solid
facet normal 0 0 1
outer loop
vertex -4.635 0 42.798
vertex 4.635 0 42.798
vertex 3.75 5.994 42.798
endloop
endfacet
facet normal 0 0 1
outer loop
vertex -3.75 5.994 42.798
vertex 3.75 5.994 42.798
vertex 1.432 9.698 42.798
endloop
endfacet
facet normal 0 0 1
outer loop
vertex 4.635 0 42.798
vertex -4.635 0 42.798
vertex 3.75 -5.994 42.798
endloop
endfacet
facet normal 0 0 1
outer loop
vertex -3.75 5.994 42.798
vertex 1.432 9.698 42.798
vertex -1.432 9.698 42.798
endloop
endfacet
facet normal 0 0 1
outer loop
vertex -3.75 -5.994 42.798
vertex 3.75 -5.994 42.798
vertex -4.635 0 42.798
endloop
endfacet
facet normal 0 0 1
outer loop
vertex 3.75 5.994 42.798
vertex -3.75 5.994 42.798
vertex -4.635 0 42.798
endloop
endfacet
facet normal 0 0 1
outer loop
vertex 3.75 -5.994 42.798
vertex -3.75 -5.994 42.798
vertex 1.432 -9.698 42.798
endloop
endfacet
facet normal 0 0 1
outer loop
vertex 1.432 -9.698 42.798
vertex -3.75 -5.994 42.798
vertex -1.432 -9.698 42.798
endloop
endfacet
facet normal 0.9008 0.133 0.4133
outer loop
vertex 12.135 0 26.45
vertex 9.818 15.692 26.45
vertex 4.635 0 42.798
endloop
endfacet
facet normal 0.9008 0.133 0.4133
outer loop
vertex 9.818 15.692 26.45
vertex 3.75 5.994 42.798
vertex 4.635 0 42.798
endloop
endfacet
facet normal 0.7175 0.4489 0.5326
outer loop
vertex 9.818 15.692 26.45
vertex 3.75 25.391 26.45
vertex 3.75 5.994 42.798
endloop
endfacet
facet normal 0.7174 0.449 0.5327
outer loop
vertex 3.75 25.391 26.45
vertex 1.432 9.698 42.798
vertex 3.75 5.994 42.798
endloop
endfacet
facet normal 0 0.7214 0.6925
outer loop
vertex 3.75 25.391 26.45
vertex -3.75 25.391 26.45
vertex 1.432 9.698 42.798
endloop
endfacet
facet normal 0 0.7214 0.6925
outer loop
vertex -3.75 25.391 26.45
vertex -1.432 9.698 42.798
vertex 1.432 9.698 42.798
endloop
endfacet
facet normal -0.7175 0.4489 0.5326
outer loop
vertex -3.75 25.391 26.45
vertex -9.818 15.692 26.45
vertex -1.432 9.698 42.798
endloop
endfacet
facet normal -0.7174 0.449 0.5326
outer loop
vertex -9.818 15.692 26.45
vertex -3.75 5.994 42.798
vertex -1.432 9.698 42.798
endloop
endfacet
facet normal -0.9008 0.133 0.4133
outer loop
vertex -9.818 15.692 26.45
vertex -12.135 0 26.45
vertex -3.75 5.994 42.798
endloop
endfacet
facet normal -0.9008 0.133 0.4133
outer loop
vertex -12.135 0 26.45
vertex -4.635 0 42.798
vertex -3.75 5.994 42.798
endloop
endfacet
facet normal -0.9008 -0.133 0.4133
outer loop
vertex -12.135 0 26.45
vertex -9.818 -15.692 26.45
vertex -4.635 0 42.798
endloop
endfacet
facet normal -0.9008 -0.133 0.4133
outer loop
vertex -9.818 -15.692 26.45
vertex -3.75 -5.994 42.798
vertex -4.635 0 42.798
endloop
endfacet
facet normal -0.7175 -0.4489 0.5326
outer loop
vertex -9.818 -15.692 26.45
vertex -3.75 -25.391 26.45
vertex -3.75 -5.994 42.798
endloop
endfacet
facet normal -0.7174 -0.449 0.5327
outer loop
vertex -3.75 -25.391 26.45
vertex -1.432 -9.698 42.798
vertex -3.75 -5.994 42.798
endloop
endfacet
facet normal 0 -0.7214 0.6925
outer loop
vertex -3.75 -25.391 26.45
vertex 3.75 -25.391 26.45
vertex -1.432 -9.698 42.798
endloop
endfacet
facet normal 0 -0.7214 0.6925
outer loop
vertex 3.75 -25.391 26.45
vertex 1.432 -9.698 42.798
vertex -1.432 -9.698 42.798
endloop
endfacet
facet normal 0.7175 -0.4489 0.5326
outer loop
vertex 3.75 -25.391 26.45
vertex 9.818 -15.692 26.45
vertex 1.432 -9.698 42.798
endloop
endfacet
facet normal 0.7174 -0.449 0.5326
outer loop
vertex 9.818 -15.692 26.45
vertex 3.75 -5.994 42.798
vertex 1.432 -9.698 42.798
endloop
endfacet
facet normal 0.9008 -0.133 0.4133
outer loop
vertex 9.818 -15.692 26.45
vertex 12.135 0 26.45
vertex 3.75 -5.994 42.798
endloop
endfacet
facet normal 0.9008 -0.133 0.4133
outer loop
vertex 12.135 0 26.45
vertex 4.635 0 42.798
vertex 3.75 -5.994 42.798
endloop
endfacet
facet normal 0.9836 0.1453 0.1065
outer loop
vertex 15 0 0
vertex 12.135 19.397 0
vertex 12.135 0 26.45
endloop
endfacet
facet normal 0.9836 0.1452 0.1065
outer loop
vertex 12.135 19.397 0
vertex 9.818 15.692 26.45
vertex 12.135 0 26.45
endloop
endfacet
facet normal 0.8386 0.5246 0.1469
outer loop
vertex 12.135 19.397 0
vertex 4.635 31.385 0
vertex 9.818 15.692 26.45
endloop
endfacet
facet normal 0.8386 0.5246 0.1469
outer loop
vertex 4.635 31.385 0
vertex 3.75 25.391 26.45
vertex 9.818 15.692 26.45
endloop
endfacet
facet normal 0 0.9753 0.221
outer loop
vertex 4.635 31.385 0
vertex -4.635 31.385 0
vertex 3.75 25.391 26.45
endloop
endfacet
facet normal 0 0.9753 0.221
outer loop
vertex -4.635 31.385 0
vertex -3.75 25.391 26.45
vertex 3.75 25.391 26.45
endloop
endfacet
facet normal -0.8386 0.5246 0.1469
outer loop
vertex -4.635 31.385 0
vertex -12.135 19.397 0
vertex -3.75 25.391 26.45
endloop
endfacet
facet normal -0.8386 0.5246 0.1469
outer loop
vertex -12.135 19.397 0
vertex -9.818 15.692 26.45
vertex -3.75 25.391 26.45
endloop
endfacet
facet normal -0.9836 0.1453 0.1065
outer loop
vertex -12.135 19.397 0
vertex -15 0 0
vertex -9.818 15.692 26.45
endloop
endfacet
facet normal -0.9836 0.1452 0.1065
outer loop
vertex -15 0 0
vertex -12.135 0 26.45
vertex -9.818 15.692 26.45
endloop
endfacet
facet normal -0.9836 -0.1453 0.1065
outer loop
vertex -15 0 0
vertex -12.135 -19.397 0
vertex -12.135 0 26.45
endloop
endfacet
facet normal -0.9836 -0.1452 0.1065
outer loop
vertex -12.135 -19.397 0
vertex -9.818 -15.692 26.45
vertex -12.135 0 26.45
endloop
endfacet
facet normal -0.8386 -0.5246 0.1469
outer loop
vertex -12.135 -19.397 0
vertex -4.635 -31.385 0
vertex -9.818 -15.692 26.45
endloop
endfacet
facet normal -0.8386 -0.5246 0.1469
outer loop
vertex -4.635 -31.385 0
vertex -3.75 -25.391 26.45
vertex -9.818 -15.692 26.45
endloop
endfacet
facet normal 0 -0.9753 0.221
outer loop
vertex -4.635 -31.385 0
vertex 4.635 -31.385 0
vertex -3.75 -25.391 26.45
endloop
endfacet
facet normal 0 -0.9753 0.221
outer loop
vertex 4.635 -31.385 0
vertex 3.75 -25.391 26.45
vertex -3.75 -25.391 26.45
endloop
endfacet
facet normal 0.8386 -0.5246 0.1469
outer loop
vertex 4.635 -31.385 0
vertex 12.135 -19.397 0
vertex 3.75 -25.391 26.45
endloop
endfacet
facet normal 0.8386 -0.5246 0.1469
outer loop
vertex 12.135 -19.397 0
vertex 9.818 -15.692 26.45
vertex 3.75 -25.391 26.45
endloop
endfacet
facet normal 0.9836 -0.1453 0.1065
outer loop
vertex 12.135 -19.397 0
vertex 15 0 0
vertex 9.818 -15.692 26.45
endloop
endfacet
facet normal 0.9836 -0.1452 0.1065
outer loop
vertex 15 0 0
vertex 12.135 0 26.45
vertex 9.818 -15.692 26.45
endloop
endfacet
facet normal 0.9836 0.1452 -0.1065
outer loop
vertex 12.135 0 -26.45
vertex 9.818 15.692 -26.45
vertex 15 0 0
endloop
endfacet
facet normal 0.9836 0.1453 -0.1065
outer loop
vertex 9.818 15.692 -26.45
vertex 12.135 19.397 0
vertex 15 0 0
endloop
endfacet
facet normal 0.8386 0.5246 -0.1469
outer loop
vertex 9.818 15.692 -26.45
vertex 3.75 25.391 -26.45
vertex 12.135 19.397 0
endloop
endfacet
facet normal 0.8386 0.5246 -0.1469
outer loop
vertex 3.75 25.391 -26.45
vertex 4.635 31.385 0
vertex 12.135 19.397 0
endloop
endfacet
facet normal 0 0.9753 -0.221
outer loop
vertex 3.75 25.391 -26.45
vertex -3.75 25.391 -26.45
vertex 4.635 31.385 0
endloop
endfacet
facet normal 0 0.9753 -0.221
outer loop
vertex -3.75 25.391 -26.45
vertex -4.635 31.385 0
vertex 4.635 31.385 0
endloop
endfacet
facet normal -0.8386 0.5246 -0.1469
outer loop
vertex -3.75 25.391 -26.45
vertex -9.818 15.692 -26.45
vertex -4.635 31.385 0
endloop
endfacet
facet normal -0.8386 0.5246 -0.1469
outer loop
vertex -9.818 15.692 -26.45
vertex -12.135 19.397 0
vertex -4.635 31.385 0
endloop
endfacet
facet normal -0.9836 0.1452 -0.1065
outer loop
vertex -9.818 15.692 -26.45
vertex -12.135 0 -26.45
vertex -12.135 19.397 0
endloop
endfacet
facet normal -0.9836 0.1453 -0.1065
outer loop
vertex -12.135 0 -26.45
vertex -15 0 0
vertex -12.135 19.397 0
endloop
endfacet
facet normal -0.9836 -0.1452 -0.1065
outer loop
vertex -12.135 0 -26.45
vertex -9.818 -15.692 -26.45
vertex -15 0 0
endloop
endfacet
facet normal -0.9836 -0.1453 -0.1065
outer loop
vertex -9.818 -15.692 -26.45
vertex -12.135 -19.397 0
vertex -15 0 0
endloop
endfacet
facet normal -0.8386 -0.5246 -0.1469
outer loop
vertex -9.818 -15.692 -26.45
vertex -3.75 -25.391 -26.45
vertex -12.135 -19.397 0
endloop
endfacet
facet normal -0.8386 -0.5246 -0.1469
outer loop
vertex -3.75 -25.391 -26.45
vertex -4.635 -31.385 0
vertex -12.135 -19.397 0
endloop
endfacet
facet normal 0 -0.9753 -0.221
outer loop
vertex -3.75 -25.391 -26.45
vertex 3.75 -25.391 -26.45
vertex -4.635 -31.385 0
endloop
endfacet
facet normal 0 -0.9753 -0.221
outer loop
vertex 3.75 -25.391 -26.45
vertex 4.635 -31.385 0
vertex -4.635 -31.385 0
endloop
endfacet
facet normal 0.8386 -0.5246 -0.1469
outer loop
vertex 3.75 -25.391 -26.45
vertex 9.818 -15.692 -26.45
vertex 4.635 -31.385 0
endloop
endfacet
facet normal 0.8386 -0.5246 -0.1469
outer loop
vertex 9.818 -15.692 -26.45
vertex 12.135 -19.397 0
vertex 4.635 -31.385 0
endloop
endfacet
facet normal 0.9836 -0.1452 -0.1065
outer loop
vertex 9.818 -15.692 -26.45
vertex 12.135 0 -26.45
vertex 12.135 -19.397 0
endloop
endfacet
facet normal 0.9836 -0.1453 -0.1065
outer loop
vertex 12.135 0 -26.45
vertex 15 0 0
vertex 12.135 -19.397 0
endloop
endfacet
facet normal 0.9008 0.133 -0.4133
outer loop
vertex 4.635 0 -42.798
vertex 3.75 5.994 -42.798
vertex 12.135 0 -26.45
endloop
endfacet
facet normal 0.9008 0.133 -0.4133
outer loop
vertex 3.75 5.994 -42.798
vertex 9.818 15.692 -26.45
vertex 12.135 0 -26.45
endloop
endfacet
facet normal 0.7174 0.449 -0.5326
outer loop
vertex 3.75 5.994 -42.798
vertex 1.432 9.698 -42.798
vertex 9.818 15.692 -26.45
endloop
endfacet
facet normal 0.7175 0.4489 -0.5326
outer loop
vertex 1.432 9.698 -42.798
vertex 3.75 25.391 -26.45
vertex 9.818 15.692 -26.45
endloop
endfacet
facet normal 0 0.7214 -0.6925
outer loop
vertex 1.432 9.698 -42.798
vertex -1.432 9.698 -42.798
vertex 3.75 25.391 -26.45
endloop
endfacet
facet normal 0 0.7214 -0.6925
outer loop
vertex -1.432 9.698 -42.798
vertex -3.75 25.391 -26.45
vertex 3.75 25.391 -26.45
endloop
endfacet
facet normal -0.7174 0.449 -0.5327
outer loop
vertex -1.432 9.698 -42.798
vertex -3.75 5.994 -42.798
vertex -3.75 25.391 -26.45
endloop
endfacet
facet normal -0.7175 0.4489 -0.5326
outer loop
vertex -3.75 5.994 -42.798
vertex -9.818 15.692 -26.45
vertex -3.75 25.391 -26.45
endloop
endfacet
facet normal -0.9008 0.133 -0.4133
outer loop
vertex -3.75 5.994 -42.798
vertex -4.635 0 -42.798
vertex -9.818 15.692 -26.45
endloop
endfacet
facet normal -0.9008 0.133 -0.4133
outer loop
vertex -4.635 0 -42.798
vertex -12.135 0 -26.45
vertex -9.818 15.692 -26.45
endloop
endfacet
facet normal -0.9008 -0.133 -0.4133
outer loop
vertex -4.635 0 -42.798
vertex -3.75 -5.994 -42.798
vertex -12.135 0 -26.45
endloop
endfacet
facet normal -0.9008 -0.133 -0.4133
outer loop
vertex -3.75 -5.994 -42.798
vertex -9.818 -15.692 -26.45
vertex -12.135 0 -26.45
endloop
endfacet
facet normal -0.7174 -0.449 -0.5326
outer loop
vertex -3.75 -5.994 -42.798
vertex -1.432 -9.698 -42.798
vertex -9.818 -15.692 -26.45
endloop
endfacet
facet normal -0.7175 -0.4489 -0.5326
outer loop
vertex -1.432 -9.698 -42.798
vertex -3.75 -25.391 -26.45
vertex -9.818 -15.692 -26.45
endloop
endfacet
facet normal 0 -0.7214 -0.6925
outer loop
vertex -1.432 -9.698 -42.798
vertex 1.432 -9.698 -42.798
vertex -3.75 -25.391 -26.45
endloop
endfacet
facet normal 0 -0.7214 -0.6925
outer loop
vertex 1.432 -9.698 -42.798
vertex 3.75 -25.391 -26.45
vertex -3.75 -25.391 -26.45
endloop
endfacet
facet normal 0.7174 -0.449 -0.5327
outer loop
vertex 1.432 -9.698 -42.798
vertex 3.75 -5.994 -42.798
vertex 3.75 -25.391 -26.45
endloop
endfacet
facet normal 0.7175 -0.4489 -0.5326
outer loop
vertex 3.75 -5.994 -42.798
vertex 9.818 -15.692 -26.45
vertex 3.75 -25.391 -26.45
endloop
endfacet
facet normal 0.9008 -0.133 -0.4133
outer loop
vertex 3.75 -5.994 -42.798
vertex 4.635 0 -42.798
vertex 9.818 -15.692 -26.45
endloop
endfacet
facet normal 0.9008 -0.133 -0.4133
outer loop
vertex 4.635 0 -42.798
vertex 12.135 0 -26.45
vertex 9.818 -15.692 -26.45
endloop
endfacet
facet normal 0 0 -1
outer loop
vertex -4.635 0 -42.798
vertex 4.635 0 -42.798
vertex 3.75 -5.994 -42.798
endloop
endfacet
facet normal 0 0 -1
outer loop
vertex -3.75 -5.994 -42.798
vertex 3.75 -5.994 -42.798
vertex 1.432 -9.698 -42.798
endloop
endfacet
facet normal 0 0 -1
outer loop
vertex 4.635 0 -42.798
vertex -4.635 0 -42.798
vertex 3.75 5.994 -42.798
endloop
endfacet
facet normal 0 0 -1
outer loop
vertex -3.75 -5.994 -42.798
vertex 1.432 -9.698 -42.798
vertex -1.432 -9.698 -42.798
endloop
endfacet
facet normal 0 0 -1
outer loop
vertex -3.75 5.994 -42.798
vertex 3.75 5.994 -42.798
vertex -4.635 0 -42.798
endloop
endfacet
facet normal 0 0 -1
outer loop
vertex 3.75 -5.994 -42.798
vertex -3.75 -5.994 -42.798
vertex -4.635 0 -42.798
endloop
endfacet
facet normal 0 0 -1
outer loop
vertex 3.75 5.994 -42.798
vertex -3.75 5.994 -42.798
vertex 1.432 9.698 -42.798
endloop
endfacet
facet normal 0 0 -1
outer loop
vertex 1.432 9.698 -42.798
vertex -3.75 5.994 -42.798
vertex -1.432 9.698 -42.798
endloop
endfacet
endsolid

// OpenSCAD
// Generated by SolidPython 1.0.1 on 2020-07-29 00:46:46


scale(v = [5, 11, 15]) {
	sphere(r = 3);
}
/***********************************************
*********      SolidPython code:      **********
************************************************
 
# import packages: SolidPython
from solid import *
from solid.utils import *
from itertools import chain, combinations, permutations


class Resize:

    def __init__(self, scad_file):
        self.scad_file = scad_file
        #self.scad_file = import_scad(scad_file)
        # cone/cylinder param:
        self.r1 = 0
        self.r2 = 0
        self.h = 0
        # rectangular prism param:
        self.w = 0
        self.l = 0
        # ellipse param:
        self.r = 0

    # import OpenScad code (file name corresponds to shape)


    # classify shape + parameters
    def assign(self, param1, param2, param3):
        if self.scad_file == 'cone.scad':
            self.r1 = param1
            self.r2 = param2
            self.h = param3
        elif self.scad_file == 'cylinder.scad':
            self.r1 = param1
            self.r2 = param2
            self.h = param3
        elif self.scad_file == 'rectangularPrism.scad':
            self.h = param1
            self.l = param2
            self.w = param3
        else:
            self.r = param1
            self.h = param2

    # resize parameters
    def iterate(self):
        x = range(3, 20, 2)
        i = 1
        if self.scad_file == 'cone.scad':
            tempList = list(permutations(x, 2))
            for temp in tempList:
                param1 = temp[0]
                param2 = temp[1]
                filepath = 'produced_scad_files/' + 'cone' + str(param1) + '_' + str(param2) + '_' + '.scad'
                scad_render_to_file(cylinder(h=param1, r1=param2, r2=0), filepath)

        elif self.scad_file == 'cylinder.scad':
            tempList = list(permutations(x, 3))
            for temp in tempList:
                param1 = temp[0]
                param2 = temp[1]
                filepath = 'produced_scad_files/' + 'cylinder' + str(param1) + '_' + str(param2) + '_' + '.scad'
                scad_render_to_file(cylinder(h=param1, r1=param2, r2=param2), filepath)

        elif self.scad_file == 'rectangularPrism.scad':
            tempList = list(permutations(x, 3))
            for temp in tempList:
                param1 = temp[0]
                param2 = temp[1]
                param3 = temp[2]
                filepath = 'produced_scad_files/' + 'rectangularPrism' + str(param1) + '_' + str(param2) + '_' + str(
                    param3) + '.scad'
                scad_render_to_file(cube(size=(param1, param2, param3)), filepath)

        elif self.scad_file == 'ellipse.scad':
            tempList = list(permutations(x, 4))
            for temp in tempList:
                param1 = temp[0]
                param2 = temp[1]
                param3 = temp[2]
                param4 = temp[3]
                filepath = 'produced_scad_files/' + 'ellipse' + str(param1) + '_' + str(param2) + '_' + str(param3) + '_' + str(param4) + '.scad'
                scad_render_to_file(scale([param1, param2, param3])(sphere(r=param4)), filepath)

    def render_to_scadfile(self):
        scad_render_to_file(scad, 'example.scad') 
 
************************************************/
